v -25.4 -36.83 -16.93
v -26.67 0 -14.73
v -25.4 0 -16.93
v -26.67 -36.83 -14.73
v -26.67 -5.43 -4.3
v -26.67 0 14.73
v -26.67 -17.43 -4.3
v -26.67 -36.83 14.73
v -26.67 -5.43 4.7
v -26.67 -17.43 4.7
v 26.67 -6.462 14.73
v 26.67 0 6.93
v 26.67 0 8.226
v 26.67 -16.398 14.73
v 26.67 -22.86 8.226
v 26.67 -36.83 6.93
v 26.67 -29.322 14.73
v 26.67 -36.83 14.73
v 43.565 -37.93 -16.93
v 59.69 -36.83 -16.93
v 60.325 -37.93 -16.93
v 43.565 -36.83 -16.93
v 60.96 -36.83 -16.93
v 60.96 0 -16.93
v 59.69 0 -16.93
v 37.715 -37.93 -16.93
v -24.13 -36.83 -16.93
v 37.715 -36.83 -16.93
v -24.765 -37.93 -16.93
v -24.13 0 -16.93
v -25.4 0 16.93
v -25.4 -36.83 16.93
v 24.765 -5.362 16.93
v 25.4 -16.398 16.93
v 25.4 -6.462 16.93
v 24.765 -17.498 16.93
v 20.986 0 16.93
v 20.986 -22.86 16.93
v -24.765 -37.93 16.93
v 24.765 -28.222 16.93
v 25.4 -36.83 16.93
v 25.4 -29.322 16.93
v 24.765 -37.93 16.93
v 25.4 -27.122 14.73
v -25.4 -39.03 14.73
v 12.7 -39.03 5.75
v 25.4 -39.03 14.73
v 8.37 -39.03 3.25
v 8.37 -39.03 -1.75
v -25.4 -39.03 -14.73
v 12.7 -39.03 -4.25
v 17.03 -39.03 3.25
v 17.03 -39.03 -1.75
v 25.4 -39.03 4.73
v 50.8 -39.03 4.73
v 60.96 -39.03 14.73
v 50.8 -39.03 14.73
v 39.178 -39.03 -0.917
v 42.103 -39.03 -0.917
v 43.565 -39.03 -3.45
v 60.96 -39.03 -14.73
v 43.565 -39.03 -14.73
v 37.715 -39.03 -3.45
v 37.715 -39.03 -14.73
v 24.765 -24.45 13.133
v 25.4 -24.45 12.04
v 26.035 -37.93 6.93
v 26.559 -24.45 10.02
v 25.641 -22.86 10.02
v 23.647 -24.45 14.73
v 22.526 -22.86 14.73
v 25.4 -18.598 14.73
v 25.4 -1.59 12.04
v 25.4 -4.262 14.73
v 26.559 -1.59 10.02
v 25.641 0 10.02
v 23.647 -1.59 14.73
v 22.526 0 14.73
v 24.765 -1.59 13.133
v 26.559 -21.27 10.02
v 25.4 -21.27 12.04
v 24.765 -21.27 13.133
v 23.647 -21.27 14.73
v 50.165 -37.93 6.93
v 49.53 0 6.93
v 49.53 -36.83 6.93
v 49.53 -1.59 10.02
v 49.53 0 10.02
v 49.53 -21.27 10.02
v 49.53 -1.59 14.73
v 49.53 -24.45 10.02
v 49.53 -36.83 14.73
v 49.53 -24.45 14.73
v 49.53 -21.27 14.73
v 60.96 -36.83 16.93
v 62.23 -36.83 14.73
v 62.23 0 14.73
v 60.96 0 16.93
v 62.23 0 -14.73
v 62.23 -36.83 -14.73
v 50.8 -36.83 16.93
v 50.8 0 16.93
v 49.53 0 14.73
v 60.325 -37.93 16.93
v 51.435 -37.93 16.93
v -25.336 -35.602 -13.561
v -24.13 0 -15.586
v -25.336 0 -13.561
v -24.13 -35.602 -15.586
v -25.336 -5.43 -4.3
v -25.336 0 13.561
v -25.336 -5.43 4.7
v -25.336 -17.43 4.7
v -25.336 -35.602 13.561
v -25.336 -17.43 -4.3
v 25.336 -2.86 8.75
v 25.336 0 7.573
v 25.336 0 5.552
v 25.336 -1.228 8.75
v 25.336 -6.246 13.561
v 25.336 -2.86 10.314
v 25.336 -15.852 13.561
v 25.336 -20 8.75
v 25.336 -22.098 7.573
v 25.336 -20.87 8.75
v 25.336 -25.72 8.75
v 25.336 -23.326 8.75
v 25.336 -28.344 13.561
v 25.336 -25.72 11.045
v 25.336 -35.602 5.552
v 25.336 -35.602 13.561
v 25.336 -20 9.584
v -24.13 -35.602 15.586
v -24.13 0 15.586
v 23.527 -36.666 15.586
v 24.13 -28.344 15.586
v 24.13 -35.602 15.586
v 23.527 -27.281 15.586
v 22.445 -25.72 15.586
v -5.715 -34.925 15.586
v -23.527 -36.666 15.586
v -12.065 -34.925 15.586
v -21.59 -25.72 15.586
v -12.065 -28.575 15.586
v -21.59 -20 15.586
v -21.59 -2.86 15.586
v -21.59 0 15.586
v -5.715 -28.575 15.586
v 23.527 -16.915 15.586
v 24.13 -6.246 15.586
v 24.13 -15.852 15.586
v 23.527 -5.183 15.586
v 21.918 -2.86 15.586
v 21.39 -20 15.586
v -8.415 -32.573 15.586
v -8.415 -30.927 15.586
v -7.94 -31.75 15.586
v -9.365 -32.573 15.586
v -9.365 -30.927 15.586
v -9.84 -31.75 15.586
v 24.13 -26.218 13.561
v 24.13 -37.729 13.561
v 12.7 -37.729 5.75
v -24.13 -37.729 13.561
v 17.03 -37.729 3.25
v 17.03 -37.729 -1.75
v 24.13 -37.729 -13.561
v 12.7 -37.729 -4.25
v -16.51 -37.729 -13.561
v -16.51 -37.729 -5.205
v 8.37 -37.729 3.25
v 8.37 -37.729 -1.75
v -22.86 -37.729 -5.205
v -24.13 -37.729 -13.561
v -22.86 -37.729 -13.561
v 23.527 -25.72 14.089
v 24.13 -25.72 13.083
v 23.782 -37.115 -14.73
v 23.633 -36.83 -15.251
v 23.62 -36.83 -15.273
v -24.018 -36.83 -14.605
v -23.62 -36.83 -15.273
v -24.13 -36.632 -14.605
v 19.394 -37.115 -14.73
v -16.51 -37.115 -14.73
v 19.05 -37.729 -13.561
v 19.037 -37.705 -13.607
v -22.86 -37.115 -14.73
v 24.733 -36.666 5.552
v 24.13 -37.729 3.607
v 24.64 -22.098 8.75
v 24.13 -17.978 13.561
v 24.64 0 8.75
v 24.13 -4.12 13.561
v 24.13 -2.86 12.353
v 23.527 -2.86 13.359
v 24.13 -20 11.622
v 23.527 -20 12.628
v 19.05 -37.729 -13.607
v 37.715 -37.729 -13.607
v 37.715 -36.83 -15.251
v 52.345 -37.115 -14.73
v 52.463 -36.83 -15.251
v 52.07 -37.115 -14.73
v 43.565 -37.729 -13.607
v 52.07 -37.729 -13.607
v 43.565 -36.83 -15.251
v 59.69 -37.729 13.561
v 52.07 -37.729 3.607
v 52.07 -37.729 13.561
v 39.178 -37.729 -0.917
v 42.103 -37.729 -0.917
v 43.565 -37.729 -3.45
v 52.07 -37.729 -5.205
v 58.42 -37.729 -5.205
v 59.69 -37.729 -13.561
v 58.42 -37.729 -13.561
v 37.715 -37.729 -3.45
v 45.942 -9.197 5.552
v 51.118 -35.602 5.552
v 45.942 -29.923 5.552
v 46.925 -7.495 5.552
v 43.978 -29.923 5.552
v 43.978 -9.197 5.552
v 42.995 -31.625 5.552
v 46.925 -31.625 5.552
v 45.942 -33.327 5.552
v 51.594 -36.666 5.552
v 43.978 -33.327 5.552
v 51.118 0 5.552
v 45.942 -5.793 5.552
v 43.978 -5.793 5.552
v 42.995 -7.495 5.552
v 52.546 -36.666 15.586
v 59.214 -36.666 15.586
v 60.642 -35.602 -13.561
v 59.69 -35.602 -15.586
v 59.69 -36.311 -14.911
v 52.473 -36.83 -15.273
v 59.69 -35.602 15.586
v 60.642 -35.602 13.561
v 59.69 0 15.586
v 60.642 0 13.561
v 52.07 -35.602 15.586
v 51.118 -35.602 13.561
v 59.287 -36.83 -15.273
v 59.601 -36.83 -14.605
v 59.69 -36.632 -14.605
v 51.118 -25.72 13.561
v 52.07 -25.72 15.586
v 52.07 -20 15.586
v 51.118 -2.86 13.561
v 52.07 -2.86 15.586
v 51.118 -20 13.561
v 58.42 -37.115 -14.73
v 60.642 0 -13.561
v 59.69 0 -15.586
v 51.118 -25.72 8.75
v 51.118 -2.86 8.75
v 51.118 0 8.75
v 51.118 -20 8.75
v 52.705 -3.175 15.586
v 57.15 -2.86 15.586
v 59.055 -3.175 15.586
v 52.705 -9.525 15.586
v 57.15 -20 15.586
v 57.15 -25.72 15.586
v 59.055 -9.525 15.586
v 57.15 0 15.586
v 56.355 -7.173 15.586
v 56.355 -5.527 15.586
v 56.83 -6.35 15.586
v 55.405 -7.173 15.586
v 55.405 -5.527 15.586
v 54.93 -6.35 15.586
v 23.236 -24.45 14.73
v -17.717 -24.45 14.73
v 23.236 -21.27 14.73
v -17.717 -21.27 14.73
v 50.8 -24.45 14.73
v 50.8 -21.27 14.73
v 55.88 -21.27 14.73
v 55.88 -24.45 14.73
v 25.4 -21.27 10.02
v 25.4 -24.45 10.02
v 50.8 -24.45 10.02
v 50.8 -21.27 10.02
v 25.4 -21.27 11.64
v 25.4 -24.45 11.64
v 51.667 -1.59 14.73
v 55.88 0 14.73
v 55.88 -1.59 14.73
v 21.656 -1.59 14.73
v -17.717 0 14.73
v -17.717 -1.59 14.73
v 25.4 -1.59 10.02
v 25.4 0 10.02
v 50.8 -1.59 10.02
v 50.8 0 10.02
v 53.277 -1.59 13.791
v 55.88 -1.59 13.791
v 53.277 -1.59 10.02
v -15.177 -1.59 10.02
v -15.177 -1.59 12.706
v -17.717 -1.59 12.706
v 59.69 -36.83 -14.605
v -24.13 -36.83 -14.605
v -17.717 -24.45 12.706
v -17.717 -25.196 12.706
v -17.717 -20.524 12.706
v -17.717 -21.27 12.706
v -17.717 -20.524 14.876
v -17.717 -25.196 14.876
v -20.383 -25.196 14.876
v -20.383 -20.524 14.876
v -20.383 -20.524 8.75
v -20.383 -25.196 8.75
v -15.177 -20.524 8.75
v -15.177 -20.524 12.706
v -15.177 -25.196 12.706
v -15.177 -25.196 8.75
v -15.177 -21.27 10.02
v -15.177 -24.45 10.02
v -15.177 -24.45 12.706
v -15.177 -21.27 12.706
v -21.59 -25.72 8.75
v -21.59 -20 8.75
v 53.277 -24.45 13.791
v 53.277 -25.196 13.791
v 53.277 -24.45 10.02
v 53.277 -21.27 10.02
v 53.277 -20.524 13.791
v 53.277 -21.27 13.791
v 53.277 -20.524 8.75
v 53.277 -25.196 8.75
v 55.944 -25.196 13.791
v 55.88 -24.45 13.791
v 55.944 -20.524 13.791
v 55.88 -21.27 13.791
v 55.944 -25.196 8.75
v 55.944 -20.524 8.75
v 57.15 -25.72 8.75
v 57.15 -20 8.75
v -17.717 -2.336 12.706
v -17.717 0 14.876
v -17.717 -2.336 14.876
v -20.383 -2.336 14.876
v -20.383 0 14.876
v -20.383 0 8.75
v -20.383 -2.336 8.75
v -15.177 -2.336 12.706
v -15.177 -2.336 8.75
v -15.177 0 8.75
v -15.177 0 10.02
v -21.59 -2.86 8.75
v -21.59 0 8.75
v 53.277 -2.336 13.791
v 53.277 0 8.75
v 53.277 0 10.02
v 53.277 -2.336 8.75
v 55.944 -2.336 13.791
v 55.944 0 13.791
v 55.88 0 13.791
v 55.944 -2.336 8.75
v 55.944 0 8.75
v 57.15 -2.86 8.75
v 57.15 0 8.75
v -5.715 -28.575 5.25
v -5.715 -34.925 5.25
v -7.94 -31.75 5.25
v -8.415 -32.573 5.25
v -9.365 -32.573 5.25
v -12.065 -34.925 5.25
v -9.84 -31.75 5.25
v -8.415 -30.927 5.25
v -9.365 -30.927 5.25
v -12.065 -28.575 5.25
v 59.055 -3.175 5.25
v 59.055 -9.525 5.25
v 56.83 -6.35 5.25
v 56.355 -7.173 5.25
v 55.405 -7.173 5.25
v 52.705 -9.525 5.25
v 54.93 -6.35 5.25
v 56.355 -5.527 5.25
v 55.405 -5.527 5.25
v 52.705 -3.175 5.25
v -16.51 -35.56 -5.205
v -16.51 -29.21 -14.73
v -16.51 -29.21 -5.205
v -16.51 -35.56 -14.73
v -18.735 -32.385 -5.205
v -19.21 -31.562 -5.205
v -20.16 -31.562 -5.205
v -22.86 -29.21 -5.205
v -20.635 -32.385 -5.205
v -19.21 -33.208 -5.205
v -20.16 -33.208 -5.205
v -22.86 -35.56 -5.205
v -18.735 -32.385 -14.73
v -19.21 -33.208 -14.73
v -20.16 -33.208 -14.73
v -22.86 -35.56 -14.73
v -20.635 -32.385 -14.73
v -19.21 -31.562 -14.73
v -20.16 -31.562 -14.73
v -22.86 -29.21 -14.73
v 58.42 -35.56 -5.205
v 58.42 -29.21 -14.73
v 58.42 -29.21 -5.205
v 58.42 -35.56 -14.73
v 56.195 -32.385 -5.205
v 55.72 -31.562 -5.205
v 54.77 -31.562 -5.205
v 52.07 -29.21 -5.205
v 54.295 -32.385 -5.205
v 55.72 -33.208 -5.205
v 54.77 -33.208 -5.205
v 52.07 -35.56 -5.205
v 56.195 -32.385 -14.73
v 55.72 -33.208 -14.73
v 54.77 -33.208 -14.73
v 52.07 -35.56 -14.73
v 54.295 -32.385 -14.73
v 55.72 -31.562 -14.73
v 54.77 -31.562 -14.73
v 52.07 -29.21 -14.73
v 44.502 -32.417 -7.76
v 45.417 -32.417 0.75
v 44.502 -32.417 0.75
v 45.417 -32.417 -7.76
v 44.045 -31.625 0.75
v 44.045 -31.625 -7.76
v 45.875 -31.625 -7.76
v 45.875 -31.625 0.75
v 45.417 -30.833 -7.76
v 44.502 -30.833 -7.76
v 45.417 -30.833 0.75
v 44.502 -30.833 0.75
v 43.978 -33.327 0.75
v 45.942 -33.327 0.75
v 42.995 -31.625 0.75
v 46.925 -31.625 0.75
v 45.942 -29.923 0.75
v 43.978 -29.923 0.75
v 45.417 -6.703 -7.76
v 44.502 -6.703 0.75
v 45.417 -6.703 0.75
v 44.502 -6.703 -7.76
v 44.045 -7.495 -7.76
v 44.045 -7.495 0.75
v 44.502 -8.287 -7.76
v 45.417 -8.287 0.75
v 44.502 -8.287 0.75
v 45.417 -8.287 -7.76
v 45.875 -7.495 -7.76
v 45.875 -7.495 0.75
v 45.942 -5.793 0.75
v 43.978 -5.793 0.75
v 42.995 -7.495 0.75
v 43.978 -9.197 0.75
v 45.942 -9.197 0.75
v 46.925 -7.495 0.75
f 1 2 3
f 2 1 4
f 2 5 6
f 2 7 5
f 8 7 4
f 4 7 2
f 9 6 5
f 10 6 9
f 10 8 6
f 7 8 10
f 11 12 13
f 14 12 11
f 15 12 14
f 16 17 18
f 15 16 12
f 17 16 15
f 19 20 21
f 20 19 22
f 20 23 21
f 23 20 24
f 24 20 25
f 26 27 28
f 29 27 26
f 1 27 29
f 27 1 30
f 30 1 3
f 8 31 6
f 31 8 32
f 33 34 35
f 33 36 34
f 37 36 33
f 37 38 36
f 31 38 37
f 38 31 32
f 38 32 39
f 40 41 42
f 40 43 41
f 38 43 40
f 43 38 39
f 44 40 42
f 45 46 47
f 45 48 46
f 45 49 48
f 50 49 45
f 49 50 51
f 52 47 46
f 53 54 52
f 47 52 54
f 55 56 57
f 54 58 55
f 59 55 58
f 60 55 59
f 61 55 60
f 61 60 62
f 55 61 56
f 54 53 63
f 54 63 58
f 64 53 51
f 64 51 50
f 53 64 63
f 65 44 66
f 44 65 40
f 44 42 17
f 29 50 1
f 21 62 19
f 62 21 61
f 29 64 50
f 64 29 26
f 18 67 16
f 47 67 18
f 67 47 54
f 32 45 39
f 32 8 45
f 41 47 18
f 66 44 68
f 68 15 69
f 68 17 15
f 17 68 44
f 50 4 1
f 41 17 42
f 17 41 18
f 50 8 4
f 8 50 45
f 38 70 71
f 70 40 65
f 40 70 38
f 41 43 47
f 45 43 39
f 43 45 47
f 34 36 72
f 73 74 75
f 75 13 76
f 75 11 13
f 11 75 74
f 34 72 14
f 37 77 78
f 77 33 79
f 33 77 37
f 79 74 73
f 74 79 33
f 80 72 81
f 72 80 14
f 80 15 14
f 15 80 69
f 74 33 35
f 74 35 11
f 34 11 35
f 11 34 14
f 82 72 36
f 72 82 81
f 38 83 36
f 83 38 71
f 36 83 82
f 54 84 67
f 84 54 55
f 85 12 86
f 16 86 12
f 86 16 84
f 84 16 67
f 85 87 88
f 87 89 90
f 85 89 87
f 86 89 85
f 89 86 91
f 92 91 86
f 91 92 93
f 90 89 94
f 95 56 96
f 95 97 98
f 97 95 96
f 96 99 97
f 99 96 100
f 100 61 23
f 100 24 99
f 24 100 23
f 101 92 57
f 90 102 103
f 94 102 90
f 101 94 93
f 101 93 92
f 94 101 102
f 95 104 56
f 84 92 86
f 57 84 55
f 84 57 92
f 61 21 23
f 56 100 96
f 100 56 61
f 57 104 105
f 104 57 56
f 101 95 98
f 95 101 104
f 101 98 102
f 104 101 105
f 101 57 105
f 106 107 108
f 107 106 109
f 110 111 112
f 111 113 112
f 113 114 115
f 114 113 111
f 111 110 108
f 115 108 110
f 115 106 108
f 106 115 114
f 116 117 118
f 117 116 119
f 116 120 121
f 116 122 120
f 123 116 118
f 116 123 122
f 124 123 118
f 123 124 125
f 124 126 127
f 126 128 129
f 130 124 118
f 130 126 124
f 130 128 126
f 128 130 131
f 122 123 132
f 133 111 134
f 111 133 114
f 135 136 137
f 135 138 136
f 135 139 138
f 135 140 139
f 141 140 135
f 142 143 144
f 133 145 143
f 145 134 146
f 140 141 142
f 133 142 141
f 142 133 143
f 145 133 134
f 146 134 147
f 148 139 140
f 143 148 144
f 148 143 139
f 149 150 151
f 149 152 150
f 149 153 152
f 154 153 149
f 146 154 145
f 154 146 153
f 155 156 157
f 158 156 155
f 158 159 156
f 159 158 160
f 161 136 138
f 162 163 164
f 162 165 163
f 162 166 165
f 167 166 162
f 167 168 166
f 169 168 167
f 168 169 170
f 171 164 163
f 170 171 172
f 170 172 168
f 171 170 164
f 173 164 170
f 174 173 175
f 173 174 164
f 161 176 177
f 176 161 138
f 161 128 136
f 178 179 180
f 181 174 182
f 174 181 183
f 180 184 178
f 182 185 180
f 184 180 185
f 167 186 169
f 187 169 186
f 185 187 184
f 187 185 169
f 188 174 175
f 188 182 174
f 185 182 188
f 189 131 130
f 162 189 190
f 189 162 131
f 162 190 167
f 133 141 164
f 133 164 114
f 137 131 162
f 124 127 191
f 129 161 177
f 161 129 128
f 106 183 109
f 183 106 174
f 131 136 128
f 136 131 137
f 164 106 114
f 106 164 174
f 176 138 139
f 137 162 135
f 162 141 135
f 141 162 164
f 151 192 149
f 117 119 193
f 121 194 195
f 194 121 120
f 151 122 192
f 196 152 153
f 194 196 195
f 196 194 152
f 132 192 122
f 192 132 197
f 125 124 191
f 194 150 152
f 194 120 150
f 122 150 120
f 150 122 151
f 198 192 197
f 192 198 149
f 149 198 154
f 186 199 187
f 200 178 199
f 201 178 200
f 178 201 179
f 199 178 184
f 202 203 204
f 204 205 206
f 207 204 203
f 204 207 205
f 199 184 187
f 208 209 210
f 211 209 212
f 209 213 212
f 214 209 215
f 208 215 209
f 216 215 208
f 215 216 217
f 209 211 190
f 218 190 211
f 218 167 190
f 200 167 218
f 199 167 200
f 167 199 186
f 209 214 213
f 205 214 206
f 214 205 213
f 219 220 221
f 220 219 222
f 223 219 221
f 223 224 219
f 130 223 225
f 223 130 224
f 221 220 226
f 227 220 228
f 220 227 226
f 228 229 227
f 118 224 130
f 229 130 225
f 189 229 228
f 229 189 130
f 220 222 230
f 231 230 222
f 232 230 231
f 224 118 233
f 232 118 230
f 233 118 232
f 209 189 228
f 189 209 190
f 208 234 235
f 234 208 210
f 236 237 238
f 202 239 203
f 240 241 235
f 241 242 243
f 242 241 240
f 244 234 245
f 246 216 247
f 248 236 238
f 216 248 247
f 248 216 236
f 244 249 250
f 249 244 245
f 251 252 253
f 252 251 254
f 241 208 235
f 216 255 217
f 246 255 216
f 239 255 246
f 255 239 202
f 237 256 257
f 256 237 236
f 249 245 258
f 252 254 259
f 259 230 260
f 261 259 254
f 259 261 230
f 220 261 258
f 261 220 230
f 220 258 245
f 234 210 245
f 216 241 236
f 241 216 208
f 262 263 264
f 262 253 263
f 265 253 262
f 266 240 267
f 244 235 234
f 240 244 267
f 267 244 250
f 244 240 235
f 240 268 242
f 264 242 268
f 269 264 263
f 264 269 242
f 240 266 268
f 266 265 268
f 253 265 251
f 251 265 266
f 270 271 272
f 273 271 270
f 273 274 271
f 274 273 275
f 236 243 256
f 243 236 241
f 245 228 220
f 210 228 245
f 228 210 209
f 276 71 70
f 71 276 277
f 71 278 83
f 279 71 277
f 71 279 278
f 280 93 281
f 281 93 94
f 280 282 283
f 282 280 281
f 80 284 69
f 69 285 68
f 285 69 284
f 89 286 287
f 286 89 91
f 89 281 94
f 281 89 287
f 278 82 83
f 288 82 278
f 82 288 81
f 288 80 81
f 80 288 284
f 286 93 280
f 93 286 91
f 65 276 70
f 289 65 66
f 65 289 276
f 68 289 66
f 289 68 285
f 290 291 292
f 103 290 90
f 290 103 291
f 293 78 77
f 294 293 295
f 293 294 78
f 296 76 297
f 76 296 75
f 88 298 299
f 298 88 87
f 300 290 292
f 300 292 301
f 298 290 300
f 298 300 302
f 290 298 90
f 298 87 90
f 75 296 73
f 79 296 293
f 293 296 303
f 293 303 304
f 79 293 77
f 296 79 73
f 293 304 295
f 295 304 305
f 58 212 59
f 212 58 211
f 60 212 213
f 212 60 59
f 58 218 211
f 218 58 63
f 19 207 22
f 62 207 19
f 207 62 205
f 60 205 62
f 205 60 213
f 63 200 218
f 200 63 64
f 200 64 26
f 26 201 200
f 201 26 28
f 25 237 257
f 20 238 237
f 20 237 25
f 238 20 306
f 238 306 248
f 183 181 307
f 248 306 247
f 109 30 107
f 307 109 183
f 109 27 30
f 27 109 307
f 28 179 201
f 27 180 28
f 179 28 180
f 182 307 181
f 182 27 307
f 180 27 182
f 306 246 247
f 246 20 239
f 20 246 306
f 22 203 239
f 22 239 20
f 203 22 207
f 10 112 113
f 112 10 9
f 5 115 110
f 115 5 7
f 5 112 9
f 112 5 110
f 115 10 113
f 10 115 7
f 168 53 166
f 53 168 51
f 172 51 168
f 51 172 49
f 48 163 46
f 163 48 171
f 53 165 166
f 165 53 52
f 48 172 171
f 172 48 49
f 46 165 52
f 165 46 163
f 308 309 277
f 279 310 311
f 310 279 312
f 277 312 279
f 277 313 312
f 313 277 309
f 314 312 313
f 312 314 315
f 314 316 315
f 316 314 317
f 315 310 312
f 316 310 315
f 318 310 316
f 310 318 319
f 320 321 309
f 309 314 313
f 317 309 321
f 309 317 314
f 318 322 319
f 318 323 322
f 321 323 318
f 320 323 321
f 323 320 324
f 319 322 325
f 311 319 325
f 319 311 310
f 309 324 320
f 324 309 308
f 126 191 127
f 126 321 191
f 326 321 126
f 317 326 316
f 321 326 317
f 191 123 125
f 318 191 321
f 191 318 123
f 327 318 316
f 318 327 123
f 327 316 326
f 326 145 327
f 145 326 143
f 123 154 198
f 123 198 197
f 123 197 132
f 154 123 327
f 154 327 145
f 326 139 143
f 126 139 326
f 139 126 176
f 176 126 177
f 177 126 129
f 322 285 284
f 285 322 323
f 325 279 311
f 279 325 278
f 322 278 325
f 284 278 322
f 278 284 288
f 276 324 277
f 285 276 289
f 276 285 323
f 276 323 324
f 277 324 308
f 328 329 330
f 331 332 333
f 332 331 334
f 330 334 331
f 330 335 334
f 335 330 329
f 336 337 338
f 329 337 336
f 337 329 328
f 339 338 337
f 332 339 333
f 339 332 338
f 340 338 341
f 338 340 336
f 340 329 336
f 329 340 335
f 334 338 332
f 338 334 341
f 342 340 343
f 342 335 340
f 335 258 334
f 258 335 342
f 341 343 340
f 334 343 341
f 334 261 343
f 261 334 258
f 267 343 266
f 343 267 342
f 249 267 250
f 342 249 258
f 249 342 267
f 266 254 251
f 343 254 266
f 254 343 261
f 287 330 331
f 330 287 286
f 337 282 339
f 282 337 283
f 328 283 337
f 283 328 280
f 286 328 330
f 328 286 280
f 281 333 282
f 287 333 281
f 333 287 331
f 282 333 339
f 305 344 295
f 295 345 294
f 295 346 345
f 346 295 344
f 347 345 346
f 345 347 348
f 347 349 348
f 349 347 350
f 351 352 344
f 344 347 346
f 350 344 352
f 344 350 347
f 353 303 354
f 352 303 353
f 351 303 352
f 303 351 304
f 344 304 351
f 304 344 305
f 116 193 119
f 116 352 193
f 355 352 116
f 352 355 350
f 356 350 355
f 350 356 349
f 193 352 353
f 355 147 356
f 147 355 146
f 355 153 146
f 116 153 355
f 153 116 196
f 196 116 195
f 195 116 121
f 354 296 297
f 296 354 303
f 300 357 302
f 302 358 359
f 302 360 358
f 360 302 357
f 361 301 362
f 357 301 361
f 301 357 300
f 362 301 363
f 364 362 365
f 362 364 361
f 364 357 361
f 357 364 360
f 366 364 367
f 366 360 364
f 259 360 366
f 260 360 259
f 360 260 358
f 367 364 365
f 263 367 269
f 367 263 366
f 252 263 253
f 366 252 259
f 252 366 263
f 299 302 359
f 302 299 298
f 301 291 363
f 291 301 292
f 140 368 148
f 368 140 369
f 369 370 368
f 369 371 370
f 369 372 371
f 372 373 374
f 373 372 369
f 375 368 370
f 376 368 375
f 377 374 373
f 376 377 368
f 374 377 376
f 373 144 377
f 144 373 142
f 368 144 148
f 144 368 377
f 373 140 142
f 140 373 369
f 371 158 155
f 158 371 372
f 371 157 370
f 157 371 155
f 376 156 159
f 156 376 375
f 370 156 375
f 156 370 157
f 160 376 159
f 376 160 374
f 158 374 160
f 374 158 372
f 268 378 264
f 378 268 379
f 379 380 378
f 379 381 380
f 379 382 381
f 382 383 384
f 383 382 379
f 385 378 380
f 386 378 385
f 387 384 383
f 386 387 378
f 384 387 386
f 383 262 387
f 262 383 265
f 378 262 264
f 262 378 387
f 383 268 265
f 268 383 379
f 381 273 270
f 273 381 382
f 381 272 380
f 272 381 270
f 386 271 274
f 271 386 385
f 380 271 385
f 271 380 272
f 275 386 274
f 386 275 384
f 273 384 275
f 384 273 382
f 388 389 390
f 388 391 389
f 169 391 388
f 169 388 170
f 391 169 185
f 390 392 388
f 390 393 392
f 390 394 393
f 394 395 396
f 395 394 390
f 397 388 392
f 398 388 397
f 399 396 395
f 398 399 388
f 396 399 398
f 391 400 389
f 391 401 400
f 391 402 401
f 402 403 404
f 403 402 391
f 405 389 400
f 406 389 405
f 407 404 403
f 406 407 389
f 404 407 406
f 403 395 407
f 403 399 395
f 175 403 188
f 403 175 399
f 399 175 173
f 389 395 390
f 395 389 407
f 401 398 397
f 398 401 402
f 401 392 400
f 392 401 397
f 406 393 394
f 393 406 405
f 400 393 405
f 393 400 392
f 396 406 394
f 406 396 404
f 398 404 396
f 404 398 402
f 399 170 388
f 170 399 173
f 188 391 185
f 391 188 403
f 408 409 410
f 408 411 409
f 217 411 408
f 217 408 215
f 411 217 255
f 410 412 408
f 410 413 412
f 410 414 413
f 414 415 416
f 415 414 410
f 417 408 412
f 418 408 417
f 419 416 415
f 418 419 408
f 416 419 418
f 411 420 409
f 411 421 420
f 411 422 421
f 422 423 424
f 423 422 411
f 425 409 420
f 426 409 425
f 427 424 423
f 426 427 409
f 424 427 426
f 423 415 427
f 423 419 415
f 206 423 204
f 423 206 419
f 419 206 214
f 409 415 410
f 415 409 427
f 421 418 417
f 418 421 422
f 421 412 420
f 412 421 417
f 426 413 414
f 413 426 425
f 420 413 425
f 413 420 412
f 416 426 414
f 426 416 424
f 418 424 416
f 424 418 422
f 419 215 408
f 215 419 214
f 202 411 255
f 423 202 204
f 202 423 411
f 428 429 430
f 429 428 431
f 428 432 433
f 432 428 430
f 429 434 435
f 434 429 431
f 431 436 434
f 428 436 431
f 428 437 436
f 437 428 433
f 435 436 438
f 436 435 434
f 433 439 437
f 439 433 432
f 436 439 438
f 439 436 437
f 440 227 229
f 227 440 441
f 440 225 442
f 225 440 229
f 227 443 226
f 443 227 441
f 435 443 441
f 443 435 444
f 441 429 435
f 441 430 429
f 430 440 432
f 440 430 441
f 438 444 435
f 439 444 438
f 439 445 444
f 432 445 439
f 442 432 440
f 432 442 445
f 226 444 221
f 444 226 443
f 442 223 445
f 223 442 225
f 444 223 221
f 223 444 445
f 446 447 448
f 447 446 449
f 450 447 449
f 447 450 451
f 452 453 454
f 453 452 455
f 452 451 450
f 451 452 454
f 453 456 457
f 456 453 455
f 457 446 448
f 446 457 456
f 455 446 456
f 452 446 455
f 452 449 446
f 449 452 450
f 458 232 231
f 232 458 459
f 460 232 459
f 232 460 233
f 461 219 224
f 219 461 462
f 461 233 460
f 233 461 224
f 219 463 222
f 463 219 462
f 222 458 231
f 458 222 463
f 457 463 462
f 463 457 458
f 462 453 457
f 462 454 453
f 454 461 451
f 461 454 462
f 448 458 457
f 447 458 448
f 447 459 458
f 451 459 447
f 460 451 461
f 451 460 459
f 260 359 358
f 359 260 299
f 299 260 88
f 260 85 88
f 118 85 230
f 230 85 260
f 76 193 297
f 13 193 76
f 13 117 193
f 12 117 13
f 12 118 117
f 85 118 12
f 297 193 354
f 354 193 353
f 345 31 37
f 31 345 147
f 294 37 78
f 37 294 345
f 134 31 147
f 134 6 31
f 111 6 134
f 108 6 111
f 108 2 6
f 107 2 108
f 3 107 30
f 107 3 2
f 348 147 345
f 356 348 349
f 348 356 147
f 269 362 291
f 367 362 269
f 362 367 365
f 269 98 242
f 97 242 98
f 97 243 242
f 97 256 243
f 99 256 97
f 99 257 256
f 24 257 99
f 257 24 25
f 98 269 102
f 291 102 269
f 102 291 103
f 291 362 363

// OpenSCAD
// pour voir les composants
voir_composant = 0 ; 
// pour voir les led
voir_led = 1 ; 
// pour vior la pedale
voir_pedale = 1 ; 
// pour lier les objets à l'impression (plot s2)
ligature=1; 
// pour lier le couvercle
ligature_couvercle = 0; 
// pour inclure le S2 et son jack
audio = 1 ; 
// pour inclure un x2 à la place du s2
x2 = 1; 
// pour inclure la pedale
pedale = 1 ;  
// pour inclure une capteur externe
capteur = 1 ;
// pour inclure le couvercle
couvercle = 0 ; 
// decalage couvercle pour l'impression
dzcouvercle = -10 ; 


// precision dessin (6=brouillon, 30=imprimable)
$fn = 6 ;

// vue en coupe 
//coupe= [500,0,0]; // pas de coupe
//coupe= [-120,00,0]; // phototransistor
//coupe= [-116,00,0]; // pcb
//coupe= [-100,00,0]; // tunnel
//coupe= [-67,00,0];// pedale
//coupe= [-45,00,0]; // led
//coupe= [83,00,0]; // 1/2 phototransistor
//coupe= [85,00,0]; // phototransistor
//coupe= [123,00,0]; // pcb
//coupe= [153,00,0]; // sans led
//coupe= [155,00,0]; // avec led
//largeur
//coupe=[0,77,0]; // led coté
//coupe=[0,-100,0]; // milieu
coupe=[0,100,0]; // milieu
//coupe=[0,-135,0]; // presque tout

pouce=1*2.54;

largeurx2 = 40 ;
longueurx2 = 67 ;
largeurs2=34;
longueurs2 = 25 ;
epcb = 1.5 ;

// intervale entre leds 
iled_pouce = 9 ; 
iled = iled_pouce *pouce ;

ex2=1.2;
dxs2 = -2*pouce ;
dys2 = 10.5*pouce ;
dzs2=-12 ;
dyjack = iled / 2 ;
dxjack = -15.5*pouce;
hjack = 3 ;
dzjack = hjack + epcb / 2;
d_trou_jack = 10 ;
dxcapteur = -1.5*pouce ;


largeur=30*pouce;
x_electronique = 20*pouce; 
x_doigt = 12*pouce;
x_led = 4*pouce;
e=pouce ;
h_doigt=10;
h_electronique = (audio==1)?22:15;
hauteur = h_doigt + h_electronique;
d_empreinte = 9*pouce ;

// TT Electronics OP555 OP145
hled= 5.84; // hauteur led 
lled = 4.45 ; // largeur led
eled = 2.54 ; // epaisseur led
dhled = 1.27 ; // distance top=>center of led
dled1 = 1.8 ; // surface active led
pled = 20-6.4 -6 ; // dimension pattes led

hdouble_led = hled + dhled + dled1 / 2 ;
edouble_led = 2*eled ;

dled = 2*(dhled+dled1/2)+(dhled-dled1/2); // dimension trou lumiere


hporteled = dled + e ; 
dzporteled = hauteur/2 ; 
dzledporteled = - hporteled/2 ;
dzcentreoptique = dzporteled +dzledporteled  ;
lporteled = lled + e/2 ; // largeur porte led

dxteensy = -9.5*pouce ;
dyteensy = -iled/2 ;
dzusbteensy = 4.3 ;
dzteensy = 0 ;
l_trou_usb = 12 ;
h_trou_usb = 9 ;

xpcb = x_electronique + x_doigt + x_led - 4*pouce ; 
ypcb = largeur - 2* pouce ; 
dzpcb = hauteur / 2 - h_doigt - epcb/2 ; 

dxpcb = -x_electronique/2 + xpcb/2 + pouce /2 ;
dxpcbled = +x_electronique/2 + x_doigt + x_led/2 -e -pouce ;

lplot = 2.5*pouce ;
dyplotcouvercle = 3.5*pouce;
dxplot1= -x_electronique/2+ dyplotcouvercle/2  + e/2 ;
dxplot2 = x_electronique/2+x_doigt+x_led-2*e-dyplotcouvercle/2 -e/2 ;
dyplot1 = -largeur/2  + dyplotcouvercle/2 + e/2  ;
dyplot2 = largeur/2 - dyplotcouvercle/2 - e/ 2;

htetevis=1.65;
dtetevis=5.6;
dvis=2.5;
dtrouvis=1.9;
dzvis = e-htetevis - 0.25 ;

// TT Eletronics 404 series
h_tt404 = 8.51 ; 
l_tt404 = 12.7 ;
L_tt404 = 26.92 ;
d_tt404 = 4.85 ;
da_tt404 = -l_tt404/2 + 7.88;
dt_tt404 = 3.56 ;
laxe_tt404 = 20.57 ;
dtrou_tt404 = 1.93 ;
daxe_tt404 = 24.13 ;
hpicot_tt404 = 3 ;
dz_tt404 = -8.51/2+3.56 ;
dxtrou_tt404 = dt_tt404-l_tt404/2 ;

dztt404 = h_tt404/2 + hpicot_tt404 - dz_tt404 ;
dxtt404 = 9.5 * pouce ;

module tt404()
{
    translate([da_tt404,0,h_tt404/2 + hpicot_tt404])
    rotate([0,180,0])
    union()
    {
        if ( voir_composant == 1)
        {
            difference()
            {
                // corps
                translate([0,-L_tt404/2,0])
                    cube([l_tt404,L_tt404,h_tt404],center=true);
               // trou vis
                translate([dxtrou_tt404,-L_tt404/2+daxe_tt404/2,0])
                    cylinder(h=10,d=dtrou_tt404,center=true);
                translate([dtrou_tt404,-L_tt404/2+daxe_tt404/2+dtrou_tt404/2,0])
                    cube([dxtrou_tt404,dtrou_tt404+0.2,10],center=true);
               // trou vis
                translate([dxtrou_tt404,-L_tt404/2-daxe_tt404/2,0])
                    cylinder(h=10,d=dtrou_tt404,center=true);
                translate([dtrou_tt404,-L_tt404/2-daxe_tt404/2-dtrou_tt404/2,0])
                    cube([dxtrou_tt404,dtrou_tt404+0.5,10],center=true);
            }
            // bouton utilisateur
            translate([da_tt404,laxe_tt404/2,dz_tt404])
                rotate([90,0,0])
                    cylinder(h=laxe_tt404,d=d_tt404,center=true);
            // picots
            translate([3.5,-6.8,8.51/2+1.5])
                cube([1,1,hpicot_tt404], center=true);
            translate([3.5,-15,8.51/2+1.5])
                cube([1,1,hpicot_tt404], center=true);
            translate([3.5,-20,8.51/2+1.5])
                cube([1,1,hpicot_tt404], center=true);
        }
        translate([dxtrou_tt404,-L_tt404/2+daxe_tt404/2,(hpicot_tt404 + epcb + e/2)/2])
                    cylinder(h=h_tt404 + hpicot_tt404 + epcb + e/2 ,
                            d=dtrou_tt404-0.1,center=true);
        translate([dxtrou_tt404,-L_tt404/2+daxe_tt404/2,(hpicot_tt404 + epcb + e/2)/2 + h_tt404 / 2])
                    cylinder(h=hpicot_tt404 + epcb + e/2 ,
                            d=dtrou_tt404+2,center=true);
        translate([dxtrou_tt404,-L_tt404/2-daxe_tt404/2,(hpicot_tt404 + epcb + e/2)/2])
                    cylinder(h=h_tt404 + hpicot_tt404 + epcb + e/2 ,
                            d=dtrou_tt404-0.1,center=true);
         translate([dxtrou_tt404,-L_tt404/2-daxe_tt404/2,(hpicot_tt404 + epcb + e/2)/2 + h_tt404 / 2])
                    cylinder(h=hpicot_tt404 + epcb + e/2 ,
                            d=dtrou_tt404+2,center=true);
    }
}
module led(sc)
{
    translate([0,0,-hled/2 + dhled])
    scale([sc,sc,sc])
    union()
    {
        cube([eled,lled,hled],center=true);
        translate([eled/2,0,hled/2 - dhled])
                cube([0.5,dled1,dled1],center=true);
        translate([0,pouce /2,-hled/2-pled/2])
            cube([0.4,0.45,pled],center = true );
        translate([0,- pouce /2,,-hled/2-pled/2])
            cube([0.4,0.45,pled],center = true) ;
    }
}
module double_led(sc)
{
    translate([0,0,dled1/2 + (dhled-dled1/2)/2])
    union()
    {
        led(sc);
        translate([eled,0,-dhled - dled1/ 2])
            led(sc);
    }
}
module jack()
{
    union()
    {
        translate([0,-8,3])
        difference()
        {
            cube([6,16,2*hjack],true);
            translate([0,2,0]) rotate([90,0,0]) cylinder(h=15,d=4,center=true);
        }
        translate([-1.5*pouce,-5.5*pouce ,0.3]) cube([2,1,0.6],true) ;
        translate([-1.5*pouce,-1.5*pouce ,0.3]) cube([2,1,0.6],true) ;
        translate([1.5*pouce,-2.0*pouce ,0.3]) cube([2,1,0.6],true) ;
    }
}
module connecteur13x2()
{
    union()
    {
       cube([5,13*pouce,9],true);
        for(i = [-6:6])
        {
            for ( j = [-0.5,0.5] )
            {
                translate([j*pouce,i*pouce,5]) cube([0.5,0.5,3],center=true);
            }
        }
    }
}
module x2()
{
    difference()
    {
        translate([longueurx2/2-4.5,0,ex2/2])
        union()
        {
            // connecteur
            translate([-28,0,4.5])
                connecteur13x2();
            // circuit 
            cube([longueurx2,largeurx2,1.5],true);
            // jack
            translate([-20,-20,-0.5])
                rotate([0,180,180])
                    jack();
            // usb
            translate([20,-20+5,-3.0])
                cube([8,10,4],true);
            // cpu
            translate([0,10,-2])
                cube([13,13,3],true); 
       }
        translate([23*pouce,-14,0])
            cylinder(h=3,d=4,center=true);
   }
}
module s2()
{
    translate([longueurs2/2-2,0,ex2/2])
    union()
    {
        // connecteur
        translate([-9.5,0,4.5])
                connecteur13x2();
        // circuit
        difference()
        {
            translate([0,0,0])
                cube([longueurs2,largeurs2,1.2],true);
            translate([9,-14,0])
                cylinder(h=3,d=4,center=true);
        }
        //composants
        translate([10.5,-9.7,1.2])
            cube([2,3,1.8],true);
        translate([5.5,-5.7,1.2])
            cube([2,3,1.8],true);
   }
}
module teensy2()
{
     union()
    {
        for(i=[-6,-5,-4,-3,2,3,5])
        {
            translate([-3*pouce,(i+0.5)* pouce ,4]) cube([0.7,0.7,8],center=true) ;
            translate([3*pouce,(i+0.5)* pouce ,4]) cube([0.7,0.7,8],center=true) ;
        }
        // circuit
        translate([0,0,7])
            cube([7.5*pouce,12*pouce,1.2],center=true);
        // usb
        translate([0,10.5,dzusbteensy])
            difference()
            {
                cube([7,9,4],true);
                cube([5,10,2],true);
            }
        // bouton
        translate([0,-4.5*pouce,4.5])
            cube([3,3,3],true);
   }
}
module pcb()
{
    if ( voir_composant == 1)
    {
        difference()
        {
            translate([0.5*pouce,0,0]) cube([xpcb ,ypcb  ,epcb],true);
            // grile pouces
            for(i = [-8,-6,-2,0,1,4,5,7])
            {
                for ( j = [-12,-6,-5,-1,8,9,12] )
                {
                    translate([i*pouce,(j-0.5)*pouce,0]) cube([0.5,0.5,5],center=true);
                }
            }
        }
        translate([dxteensy,dyteensy,dzteensy]) rotate([180,0,-90]) teensy2() ;
        if ( audio == 1 )
        {
            // jack
            translate([dxjack,dyjack,-epcb / 2]) rotate([180,0,-90]) jack() ;
            // pins
            translate([3*pouce,dys2 ,-4]) cube([0.7,0.7,8],center=true) ;
            translate([-2*pouce,dys2 ,-4]) cube([0.7,0.7,8],center=true) ;
            translate([3*pouce,dys2-pouce ,-4]) cube([0.7,0.7,8],center=true) ;
            translate([-2*pouce,dys2-pouce ,-4]) cube([0.7,0.7,8],center=true) ;
            // expander
            translate([dxs2,dys2,dzs2  ] ) 
                    rotate([0,0,-90])
                        if ( x2 == 1 )
                            x2() ;
                        else
                            s2() ;
        }
        if ( capteur == 1 )
        {
            // jack        
            translate([dxcapteur,-ypcb/2,-epcb / 2]) 
                rotate([180,0,0])
                    jack() ;
        }
    }
    if ( pedale == 1 )
    {
        translate([dxtt404,-ypcb/2 + pouce,-epcb / 2]) 
            rotate([180,0,0])
                tt404() ;
    }
}
module contour(x,y,z)
{
    minkowski() {
        cube([x-e,y-e,z-e],true);
        // coins arrondis
        sphere(r=e);
    }
}
module dedans(x,y,z)
{
    scale([(x-e)/x,(y-e)/y,(z-e)/z]) contour(x,y,z);
    /* 
    minkowski() {
        cube([x-e-2*e,y-e-2*e,z-e-2*e],true);
        // coins arrondis
        sphere(r=e);
    }
    */
}
module echancrure_empreinte(x,y,z,dy)
{
     translate([x/2+d_empreinte/5,dy,z/2+d_empreinte/6]) rotate([0,-35,0]) cylinder(d=d_empreinte,h=2*z,center=true);

}
module contour_electronique(x,y,z)
{
    minkowski()
    {
        difference()
        {
            cube([x-e,y-e,z-e],center=true);
            for(nrled = [-1:1] )
            {
                echancrure_empreinte(x,y,z,nrled*iled);
            }
        }
        sphere(r=e);
    }

 }
module dedans_electronique(x,y,z)
{
    scale([(x-e)/x,(y-e)/y,(z-e)/z])
        contour_electronique(x,y,z);    
}
module porteled(l, doubleled)
{
    translate([0,0,dzledporteled])
    union()
    {
        difference()
        {
            // tunnel
                translate([(l+eled)/2,0,0])
                    cube([eled + e + l + eled ,
                            lporteled,
                            hporteled  ],center=true);
            // trou lumiere
                translate([(l+eled)/2,0,0])
                    cube([eled  + l + eled ,
                            lporteled - e ,
                            hporteled - e ],center=true);
            // moins logement led
            if (doubleled == 1)
                led(1.05) ;
            else
                double_led(1.05) ;
            // ouverture tunnel extrémité
            translate([10 + (l+eled/2),0,0])
                cube([20 ,20,20],center=true);
            // moins degagement pour inserer la led
            *translate([-e/2,0,-10-hled/2])
                cube([eled*doubleled + 1.5* e ,20,20],center=true);
        }
        if ((voir_composant == 1) && (voir_led == 1))
        {
            if (doubleled == 1)
                led(1);
            else
                double_led(1) ;
        }
    }
}
module plot(h,vis)
{
    translate([0,0,h/2])
        difference()
        {
            cube([lplot,lplot,h],center=true);
            cylinder(h=h,d=dtrouvis,center=true);
        }
    if ( voir_composant)
    {
        if (vis)
        {
            translate([0,0,6/2-epcb])
                cylinder(h=6,d=1.5,center=true);
            translate([0,0,2/2-2.1*epcb])
                cylinder(h=2,d=4.5,center=true);
        }
    }
}
module fond(zplus,xyminus)
{
    lfond = x_doigt+x_electronique+x_led - 3*e + xyminus ;
    translate([lfond/2-x_electronique/2 +e/2 - xyminus/2 ,0,0])
         cube([lfond,largeur - e +xyminus ,zplus+e],true);
}
module bouton(lbouton,dbouton)
{
    rotate([90,0,0])
    union()
    {
        translate([0,0,-dbouton/8])
            cylinder(h=lbouton-dbouton/4,d=dbouton,center=true);
        translate([0,0,lbouton/2-dbouton/4])
            sphere(d=dbouton,center=true);
    }

}
module plot_couvercle(dx,dy)
{
    translate([dx,dy,-hauteur/2 + e/2 ])
    {
        union()
        {
            plot(1.5*lplot,false);
            if (dy > 0)
                translate([0,lplot/2+(largeur/2-abs(dy)- lplot/2)/2,1.5*lplot/2])
                    cube([lplot,largeur/2-abs(dy)- lplot/2,1.5*lplot],center=true);
            else
                translate([0,-(lplot/2+(largeur/2-abs(dy)- lplot/2)/2),1.5*lplot/2])
                    cube([lplot,largeur/2-abs(dy)- lplot/2,1.5*lplot],center=true);
        }
    }
}
module trou_couvercle(dx,dy)
{
    translate([dx,dy,0])
        cylinder(h=2*e,d=dvis,center=true);            
    translate([dx,dy,-dzvis/2 - e/2 +dzvis ])
        cylinder(h=dzvis,d=dtetevis,center=true);            
    translate([dx,dy,-htetevis/2 -e/2 +dzvis +htetevis ])
        cylinder(h=htetevis,d1=dtetevis,d2=dvis,center=true);            
}
module boite ()
{
    union()
    {
        difference()
        {
            // boitier plein
            union()
            {
                contour_electronique(x_electronique,largeur,hauteur);
                translate([x_doigt/2 + x_electronique/2 -e  , 0,-h_doigt/2])
                    contour(x_doigt,largeur,h_electronique);
                translate([x_led/2 + x_doigt + x_electronique/2 - 2* e ,0,0])
                    contour(x_led,largeur,hauteur);
            }
            // evidement boitier
            union()
            {
                dedans_electronique(x_electronique,largeur,hauteur);
                translate([x_doigt/2 + x_electronique/2 -e , 0,-h_doigt/2])
                    dedans(x_doigt+4*e,largeur,h_electronique);
                translate([x_led/2 + x_doigt + x_electronique/2 - 2 * e ,0,0])
                    dedans(x_led,largeur,hauteur);
            }
            // trous pour les chemins optiques
            union()
            {           
                for(nrled = [-1:1] )
                {
                    translate([x_doigt/2 + x_electronique/2 -pouce ,nrled * iled,dzcentreoptique  ])
                       cube([x_doigt+4*pouce,
                                lporteled - e ,
                                hporteled - e ],center=true);
                }
            }
            // couvercle_fond
            translate([0,0,-hauteur/2]) fond(0.25,0) ;
            // trou fiche usb
            translate([-x_electronique/2,dyteensy,-dzusbteensy - dzteensy + dzpcb  - epcb/2])
                cube([2*pouce,l_trou_usb ,h_trou_usb ],center=true);
            
            if ( audio == 1 )
            {
                // trou fiche jack audio
                translate([-x_electronique/2,dyjack,-dzjack + dzpcb - epcb/2 ]) 
                    rotate([0,90,0]) 
                        cylinder(h=2*pouce,d=d_trou_jack,center = true);
            }
            if ( capteur == 1 )
            {
                // trou fiche jack capteur
                translate([dxpcb+ dxcapteur, -largeur/2,-dzjack + dzpcb - epcb/2 ]) 
                    rotate([0,90,90]) 
                        cylinder(h=2*pouce,d=d_trou_jack,center = true);
            }
            if ( pedale == 1)
            {
                // trou pedale
                translate([dxpcb+ dxtt404 ,-largeur/2, - dztt404 + dzpcb - epcb/2 ]) 
                {
                    rotate([90,0,0])
                        cylinder(h=10,d=d_tt404  + 1 ,center = true);
                    translate([0,0,-10])
                        cube([d_tt404  + 1, 6*e,20],center=true);
                }
            }
       } 
    }
    // chemins optiques   
    for(nrled = [-1:1] )
    {
        // recepteur
        difference()
        {
            translate([-(x_electronique -3*e )/2 +  e,nrled * iled,dzporteled  ])
               porteled(x_electronique - 3*e , 2 );
            translate([e,0,0])
                echancrure_empreinte(x_electronique,largeur,hauteur,nrled * iled);
        }
        // emetteur
        translate([x_doigt + x_electronique/2 -pouce/2 ,nrled * iled,dzporteled ])
                rotate([0,0,180])
                    porteled(pouce , 1);
    }
    // couvercle avec trous de vis
    if ( couvercle == 1 )
    {
        translate([0,0,-hauteur/2 + dzcouvercle ])
            union()
            {
                difference()
                {
                    fond(0,-0.5);
                    trou_couvercle(dxplot1,dyplot1);
                    trou_couvercle(dxplot2,dyplot1);
                    trou_couvercle(dxplot1,dyplot2);
                    trou_couvercle(dxplot2,dyplot2);                }
                //attaches pour l'impression
                if ( ligature_couvercle == 1)
                {
                    translate([dxplot1-2,dyplot1-2,3])cube([1,1,6],center=true);
                    translate([dxplot2+2,dyplot2+2,3])cube([1,1,6],center=true);
                }
            }
    }
        
    // fixation
    union()
    {
        // pcb
        *translate([-5.5*pouce,-12.5*pouce,dzpcb ])
              plot(hauteur/2 - dzpcb,true);
        *translate([-5.5*pouce,12.5*pouce,dzpcb ])
              plot(hauteur/2 - dzpcb,true);
        translate([-3.5*pouce,-12.5*pouce,dzpcb ])
              plot(hauteur/2 - dzpcb,true);
        translate([-3.5*pouce,12.5*pouce,dzpcb ])
              plot(hauteur/2 - dzpcb,true);
        translate([x_electronique/2+x_doigt,-lplot ,dzpcb])
                plot(hauteur/2 - dzpcb,true);
        // couvercle
        plot_couvercle(dxplot1,dyplot1);
        plot_couvercle(dxplot2,dyplot1);
        plot_couvercle(dxplot1,dyplot2);
        plot_couvercle(dxplot2,dyplot2);
        if ( x2 == 1 )
        {
            //x2
            translate([-1*pouce,-12.5*pouce,dzpcb+dzs2])
            *union()
            {
                plot(-dzs2 -epcb ,true);
                if ( ligature == 1)
                {
                    translate([0,-3.5,1])
                    rotate([90,0,0]) cube([1,1,5],center=true);
                }
            }
        }
    }
     // composants
    translate([dxpcb ,0,dzpcb - epcb/2 ] ) 
            pcb() ;
 }
*tt404();
*plot(6,lplot,true);
*pcb();
*teensy2();
*porteled(5,2);
*led(1);
*double_led();
*chanfrein(10,10,3);
*s2(); 
*x2();
*jack();
difference()
{
    boite() ;
    translate(coupe)   
        cube([200,200,200], center = true);
}
echo("largeur=",largeur," longueur=",x_electronique+x_doigt+x_led, " hauteur=",hauteur);
echo ("xpcb=",xpcb, " ypcb=",ypcb);
echo ("dxtrou tt404=",dxtrou_tt404+da_tt404);
